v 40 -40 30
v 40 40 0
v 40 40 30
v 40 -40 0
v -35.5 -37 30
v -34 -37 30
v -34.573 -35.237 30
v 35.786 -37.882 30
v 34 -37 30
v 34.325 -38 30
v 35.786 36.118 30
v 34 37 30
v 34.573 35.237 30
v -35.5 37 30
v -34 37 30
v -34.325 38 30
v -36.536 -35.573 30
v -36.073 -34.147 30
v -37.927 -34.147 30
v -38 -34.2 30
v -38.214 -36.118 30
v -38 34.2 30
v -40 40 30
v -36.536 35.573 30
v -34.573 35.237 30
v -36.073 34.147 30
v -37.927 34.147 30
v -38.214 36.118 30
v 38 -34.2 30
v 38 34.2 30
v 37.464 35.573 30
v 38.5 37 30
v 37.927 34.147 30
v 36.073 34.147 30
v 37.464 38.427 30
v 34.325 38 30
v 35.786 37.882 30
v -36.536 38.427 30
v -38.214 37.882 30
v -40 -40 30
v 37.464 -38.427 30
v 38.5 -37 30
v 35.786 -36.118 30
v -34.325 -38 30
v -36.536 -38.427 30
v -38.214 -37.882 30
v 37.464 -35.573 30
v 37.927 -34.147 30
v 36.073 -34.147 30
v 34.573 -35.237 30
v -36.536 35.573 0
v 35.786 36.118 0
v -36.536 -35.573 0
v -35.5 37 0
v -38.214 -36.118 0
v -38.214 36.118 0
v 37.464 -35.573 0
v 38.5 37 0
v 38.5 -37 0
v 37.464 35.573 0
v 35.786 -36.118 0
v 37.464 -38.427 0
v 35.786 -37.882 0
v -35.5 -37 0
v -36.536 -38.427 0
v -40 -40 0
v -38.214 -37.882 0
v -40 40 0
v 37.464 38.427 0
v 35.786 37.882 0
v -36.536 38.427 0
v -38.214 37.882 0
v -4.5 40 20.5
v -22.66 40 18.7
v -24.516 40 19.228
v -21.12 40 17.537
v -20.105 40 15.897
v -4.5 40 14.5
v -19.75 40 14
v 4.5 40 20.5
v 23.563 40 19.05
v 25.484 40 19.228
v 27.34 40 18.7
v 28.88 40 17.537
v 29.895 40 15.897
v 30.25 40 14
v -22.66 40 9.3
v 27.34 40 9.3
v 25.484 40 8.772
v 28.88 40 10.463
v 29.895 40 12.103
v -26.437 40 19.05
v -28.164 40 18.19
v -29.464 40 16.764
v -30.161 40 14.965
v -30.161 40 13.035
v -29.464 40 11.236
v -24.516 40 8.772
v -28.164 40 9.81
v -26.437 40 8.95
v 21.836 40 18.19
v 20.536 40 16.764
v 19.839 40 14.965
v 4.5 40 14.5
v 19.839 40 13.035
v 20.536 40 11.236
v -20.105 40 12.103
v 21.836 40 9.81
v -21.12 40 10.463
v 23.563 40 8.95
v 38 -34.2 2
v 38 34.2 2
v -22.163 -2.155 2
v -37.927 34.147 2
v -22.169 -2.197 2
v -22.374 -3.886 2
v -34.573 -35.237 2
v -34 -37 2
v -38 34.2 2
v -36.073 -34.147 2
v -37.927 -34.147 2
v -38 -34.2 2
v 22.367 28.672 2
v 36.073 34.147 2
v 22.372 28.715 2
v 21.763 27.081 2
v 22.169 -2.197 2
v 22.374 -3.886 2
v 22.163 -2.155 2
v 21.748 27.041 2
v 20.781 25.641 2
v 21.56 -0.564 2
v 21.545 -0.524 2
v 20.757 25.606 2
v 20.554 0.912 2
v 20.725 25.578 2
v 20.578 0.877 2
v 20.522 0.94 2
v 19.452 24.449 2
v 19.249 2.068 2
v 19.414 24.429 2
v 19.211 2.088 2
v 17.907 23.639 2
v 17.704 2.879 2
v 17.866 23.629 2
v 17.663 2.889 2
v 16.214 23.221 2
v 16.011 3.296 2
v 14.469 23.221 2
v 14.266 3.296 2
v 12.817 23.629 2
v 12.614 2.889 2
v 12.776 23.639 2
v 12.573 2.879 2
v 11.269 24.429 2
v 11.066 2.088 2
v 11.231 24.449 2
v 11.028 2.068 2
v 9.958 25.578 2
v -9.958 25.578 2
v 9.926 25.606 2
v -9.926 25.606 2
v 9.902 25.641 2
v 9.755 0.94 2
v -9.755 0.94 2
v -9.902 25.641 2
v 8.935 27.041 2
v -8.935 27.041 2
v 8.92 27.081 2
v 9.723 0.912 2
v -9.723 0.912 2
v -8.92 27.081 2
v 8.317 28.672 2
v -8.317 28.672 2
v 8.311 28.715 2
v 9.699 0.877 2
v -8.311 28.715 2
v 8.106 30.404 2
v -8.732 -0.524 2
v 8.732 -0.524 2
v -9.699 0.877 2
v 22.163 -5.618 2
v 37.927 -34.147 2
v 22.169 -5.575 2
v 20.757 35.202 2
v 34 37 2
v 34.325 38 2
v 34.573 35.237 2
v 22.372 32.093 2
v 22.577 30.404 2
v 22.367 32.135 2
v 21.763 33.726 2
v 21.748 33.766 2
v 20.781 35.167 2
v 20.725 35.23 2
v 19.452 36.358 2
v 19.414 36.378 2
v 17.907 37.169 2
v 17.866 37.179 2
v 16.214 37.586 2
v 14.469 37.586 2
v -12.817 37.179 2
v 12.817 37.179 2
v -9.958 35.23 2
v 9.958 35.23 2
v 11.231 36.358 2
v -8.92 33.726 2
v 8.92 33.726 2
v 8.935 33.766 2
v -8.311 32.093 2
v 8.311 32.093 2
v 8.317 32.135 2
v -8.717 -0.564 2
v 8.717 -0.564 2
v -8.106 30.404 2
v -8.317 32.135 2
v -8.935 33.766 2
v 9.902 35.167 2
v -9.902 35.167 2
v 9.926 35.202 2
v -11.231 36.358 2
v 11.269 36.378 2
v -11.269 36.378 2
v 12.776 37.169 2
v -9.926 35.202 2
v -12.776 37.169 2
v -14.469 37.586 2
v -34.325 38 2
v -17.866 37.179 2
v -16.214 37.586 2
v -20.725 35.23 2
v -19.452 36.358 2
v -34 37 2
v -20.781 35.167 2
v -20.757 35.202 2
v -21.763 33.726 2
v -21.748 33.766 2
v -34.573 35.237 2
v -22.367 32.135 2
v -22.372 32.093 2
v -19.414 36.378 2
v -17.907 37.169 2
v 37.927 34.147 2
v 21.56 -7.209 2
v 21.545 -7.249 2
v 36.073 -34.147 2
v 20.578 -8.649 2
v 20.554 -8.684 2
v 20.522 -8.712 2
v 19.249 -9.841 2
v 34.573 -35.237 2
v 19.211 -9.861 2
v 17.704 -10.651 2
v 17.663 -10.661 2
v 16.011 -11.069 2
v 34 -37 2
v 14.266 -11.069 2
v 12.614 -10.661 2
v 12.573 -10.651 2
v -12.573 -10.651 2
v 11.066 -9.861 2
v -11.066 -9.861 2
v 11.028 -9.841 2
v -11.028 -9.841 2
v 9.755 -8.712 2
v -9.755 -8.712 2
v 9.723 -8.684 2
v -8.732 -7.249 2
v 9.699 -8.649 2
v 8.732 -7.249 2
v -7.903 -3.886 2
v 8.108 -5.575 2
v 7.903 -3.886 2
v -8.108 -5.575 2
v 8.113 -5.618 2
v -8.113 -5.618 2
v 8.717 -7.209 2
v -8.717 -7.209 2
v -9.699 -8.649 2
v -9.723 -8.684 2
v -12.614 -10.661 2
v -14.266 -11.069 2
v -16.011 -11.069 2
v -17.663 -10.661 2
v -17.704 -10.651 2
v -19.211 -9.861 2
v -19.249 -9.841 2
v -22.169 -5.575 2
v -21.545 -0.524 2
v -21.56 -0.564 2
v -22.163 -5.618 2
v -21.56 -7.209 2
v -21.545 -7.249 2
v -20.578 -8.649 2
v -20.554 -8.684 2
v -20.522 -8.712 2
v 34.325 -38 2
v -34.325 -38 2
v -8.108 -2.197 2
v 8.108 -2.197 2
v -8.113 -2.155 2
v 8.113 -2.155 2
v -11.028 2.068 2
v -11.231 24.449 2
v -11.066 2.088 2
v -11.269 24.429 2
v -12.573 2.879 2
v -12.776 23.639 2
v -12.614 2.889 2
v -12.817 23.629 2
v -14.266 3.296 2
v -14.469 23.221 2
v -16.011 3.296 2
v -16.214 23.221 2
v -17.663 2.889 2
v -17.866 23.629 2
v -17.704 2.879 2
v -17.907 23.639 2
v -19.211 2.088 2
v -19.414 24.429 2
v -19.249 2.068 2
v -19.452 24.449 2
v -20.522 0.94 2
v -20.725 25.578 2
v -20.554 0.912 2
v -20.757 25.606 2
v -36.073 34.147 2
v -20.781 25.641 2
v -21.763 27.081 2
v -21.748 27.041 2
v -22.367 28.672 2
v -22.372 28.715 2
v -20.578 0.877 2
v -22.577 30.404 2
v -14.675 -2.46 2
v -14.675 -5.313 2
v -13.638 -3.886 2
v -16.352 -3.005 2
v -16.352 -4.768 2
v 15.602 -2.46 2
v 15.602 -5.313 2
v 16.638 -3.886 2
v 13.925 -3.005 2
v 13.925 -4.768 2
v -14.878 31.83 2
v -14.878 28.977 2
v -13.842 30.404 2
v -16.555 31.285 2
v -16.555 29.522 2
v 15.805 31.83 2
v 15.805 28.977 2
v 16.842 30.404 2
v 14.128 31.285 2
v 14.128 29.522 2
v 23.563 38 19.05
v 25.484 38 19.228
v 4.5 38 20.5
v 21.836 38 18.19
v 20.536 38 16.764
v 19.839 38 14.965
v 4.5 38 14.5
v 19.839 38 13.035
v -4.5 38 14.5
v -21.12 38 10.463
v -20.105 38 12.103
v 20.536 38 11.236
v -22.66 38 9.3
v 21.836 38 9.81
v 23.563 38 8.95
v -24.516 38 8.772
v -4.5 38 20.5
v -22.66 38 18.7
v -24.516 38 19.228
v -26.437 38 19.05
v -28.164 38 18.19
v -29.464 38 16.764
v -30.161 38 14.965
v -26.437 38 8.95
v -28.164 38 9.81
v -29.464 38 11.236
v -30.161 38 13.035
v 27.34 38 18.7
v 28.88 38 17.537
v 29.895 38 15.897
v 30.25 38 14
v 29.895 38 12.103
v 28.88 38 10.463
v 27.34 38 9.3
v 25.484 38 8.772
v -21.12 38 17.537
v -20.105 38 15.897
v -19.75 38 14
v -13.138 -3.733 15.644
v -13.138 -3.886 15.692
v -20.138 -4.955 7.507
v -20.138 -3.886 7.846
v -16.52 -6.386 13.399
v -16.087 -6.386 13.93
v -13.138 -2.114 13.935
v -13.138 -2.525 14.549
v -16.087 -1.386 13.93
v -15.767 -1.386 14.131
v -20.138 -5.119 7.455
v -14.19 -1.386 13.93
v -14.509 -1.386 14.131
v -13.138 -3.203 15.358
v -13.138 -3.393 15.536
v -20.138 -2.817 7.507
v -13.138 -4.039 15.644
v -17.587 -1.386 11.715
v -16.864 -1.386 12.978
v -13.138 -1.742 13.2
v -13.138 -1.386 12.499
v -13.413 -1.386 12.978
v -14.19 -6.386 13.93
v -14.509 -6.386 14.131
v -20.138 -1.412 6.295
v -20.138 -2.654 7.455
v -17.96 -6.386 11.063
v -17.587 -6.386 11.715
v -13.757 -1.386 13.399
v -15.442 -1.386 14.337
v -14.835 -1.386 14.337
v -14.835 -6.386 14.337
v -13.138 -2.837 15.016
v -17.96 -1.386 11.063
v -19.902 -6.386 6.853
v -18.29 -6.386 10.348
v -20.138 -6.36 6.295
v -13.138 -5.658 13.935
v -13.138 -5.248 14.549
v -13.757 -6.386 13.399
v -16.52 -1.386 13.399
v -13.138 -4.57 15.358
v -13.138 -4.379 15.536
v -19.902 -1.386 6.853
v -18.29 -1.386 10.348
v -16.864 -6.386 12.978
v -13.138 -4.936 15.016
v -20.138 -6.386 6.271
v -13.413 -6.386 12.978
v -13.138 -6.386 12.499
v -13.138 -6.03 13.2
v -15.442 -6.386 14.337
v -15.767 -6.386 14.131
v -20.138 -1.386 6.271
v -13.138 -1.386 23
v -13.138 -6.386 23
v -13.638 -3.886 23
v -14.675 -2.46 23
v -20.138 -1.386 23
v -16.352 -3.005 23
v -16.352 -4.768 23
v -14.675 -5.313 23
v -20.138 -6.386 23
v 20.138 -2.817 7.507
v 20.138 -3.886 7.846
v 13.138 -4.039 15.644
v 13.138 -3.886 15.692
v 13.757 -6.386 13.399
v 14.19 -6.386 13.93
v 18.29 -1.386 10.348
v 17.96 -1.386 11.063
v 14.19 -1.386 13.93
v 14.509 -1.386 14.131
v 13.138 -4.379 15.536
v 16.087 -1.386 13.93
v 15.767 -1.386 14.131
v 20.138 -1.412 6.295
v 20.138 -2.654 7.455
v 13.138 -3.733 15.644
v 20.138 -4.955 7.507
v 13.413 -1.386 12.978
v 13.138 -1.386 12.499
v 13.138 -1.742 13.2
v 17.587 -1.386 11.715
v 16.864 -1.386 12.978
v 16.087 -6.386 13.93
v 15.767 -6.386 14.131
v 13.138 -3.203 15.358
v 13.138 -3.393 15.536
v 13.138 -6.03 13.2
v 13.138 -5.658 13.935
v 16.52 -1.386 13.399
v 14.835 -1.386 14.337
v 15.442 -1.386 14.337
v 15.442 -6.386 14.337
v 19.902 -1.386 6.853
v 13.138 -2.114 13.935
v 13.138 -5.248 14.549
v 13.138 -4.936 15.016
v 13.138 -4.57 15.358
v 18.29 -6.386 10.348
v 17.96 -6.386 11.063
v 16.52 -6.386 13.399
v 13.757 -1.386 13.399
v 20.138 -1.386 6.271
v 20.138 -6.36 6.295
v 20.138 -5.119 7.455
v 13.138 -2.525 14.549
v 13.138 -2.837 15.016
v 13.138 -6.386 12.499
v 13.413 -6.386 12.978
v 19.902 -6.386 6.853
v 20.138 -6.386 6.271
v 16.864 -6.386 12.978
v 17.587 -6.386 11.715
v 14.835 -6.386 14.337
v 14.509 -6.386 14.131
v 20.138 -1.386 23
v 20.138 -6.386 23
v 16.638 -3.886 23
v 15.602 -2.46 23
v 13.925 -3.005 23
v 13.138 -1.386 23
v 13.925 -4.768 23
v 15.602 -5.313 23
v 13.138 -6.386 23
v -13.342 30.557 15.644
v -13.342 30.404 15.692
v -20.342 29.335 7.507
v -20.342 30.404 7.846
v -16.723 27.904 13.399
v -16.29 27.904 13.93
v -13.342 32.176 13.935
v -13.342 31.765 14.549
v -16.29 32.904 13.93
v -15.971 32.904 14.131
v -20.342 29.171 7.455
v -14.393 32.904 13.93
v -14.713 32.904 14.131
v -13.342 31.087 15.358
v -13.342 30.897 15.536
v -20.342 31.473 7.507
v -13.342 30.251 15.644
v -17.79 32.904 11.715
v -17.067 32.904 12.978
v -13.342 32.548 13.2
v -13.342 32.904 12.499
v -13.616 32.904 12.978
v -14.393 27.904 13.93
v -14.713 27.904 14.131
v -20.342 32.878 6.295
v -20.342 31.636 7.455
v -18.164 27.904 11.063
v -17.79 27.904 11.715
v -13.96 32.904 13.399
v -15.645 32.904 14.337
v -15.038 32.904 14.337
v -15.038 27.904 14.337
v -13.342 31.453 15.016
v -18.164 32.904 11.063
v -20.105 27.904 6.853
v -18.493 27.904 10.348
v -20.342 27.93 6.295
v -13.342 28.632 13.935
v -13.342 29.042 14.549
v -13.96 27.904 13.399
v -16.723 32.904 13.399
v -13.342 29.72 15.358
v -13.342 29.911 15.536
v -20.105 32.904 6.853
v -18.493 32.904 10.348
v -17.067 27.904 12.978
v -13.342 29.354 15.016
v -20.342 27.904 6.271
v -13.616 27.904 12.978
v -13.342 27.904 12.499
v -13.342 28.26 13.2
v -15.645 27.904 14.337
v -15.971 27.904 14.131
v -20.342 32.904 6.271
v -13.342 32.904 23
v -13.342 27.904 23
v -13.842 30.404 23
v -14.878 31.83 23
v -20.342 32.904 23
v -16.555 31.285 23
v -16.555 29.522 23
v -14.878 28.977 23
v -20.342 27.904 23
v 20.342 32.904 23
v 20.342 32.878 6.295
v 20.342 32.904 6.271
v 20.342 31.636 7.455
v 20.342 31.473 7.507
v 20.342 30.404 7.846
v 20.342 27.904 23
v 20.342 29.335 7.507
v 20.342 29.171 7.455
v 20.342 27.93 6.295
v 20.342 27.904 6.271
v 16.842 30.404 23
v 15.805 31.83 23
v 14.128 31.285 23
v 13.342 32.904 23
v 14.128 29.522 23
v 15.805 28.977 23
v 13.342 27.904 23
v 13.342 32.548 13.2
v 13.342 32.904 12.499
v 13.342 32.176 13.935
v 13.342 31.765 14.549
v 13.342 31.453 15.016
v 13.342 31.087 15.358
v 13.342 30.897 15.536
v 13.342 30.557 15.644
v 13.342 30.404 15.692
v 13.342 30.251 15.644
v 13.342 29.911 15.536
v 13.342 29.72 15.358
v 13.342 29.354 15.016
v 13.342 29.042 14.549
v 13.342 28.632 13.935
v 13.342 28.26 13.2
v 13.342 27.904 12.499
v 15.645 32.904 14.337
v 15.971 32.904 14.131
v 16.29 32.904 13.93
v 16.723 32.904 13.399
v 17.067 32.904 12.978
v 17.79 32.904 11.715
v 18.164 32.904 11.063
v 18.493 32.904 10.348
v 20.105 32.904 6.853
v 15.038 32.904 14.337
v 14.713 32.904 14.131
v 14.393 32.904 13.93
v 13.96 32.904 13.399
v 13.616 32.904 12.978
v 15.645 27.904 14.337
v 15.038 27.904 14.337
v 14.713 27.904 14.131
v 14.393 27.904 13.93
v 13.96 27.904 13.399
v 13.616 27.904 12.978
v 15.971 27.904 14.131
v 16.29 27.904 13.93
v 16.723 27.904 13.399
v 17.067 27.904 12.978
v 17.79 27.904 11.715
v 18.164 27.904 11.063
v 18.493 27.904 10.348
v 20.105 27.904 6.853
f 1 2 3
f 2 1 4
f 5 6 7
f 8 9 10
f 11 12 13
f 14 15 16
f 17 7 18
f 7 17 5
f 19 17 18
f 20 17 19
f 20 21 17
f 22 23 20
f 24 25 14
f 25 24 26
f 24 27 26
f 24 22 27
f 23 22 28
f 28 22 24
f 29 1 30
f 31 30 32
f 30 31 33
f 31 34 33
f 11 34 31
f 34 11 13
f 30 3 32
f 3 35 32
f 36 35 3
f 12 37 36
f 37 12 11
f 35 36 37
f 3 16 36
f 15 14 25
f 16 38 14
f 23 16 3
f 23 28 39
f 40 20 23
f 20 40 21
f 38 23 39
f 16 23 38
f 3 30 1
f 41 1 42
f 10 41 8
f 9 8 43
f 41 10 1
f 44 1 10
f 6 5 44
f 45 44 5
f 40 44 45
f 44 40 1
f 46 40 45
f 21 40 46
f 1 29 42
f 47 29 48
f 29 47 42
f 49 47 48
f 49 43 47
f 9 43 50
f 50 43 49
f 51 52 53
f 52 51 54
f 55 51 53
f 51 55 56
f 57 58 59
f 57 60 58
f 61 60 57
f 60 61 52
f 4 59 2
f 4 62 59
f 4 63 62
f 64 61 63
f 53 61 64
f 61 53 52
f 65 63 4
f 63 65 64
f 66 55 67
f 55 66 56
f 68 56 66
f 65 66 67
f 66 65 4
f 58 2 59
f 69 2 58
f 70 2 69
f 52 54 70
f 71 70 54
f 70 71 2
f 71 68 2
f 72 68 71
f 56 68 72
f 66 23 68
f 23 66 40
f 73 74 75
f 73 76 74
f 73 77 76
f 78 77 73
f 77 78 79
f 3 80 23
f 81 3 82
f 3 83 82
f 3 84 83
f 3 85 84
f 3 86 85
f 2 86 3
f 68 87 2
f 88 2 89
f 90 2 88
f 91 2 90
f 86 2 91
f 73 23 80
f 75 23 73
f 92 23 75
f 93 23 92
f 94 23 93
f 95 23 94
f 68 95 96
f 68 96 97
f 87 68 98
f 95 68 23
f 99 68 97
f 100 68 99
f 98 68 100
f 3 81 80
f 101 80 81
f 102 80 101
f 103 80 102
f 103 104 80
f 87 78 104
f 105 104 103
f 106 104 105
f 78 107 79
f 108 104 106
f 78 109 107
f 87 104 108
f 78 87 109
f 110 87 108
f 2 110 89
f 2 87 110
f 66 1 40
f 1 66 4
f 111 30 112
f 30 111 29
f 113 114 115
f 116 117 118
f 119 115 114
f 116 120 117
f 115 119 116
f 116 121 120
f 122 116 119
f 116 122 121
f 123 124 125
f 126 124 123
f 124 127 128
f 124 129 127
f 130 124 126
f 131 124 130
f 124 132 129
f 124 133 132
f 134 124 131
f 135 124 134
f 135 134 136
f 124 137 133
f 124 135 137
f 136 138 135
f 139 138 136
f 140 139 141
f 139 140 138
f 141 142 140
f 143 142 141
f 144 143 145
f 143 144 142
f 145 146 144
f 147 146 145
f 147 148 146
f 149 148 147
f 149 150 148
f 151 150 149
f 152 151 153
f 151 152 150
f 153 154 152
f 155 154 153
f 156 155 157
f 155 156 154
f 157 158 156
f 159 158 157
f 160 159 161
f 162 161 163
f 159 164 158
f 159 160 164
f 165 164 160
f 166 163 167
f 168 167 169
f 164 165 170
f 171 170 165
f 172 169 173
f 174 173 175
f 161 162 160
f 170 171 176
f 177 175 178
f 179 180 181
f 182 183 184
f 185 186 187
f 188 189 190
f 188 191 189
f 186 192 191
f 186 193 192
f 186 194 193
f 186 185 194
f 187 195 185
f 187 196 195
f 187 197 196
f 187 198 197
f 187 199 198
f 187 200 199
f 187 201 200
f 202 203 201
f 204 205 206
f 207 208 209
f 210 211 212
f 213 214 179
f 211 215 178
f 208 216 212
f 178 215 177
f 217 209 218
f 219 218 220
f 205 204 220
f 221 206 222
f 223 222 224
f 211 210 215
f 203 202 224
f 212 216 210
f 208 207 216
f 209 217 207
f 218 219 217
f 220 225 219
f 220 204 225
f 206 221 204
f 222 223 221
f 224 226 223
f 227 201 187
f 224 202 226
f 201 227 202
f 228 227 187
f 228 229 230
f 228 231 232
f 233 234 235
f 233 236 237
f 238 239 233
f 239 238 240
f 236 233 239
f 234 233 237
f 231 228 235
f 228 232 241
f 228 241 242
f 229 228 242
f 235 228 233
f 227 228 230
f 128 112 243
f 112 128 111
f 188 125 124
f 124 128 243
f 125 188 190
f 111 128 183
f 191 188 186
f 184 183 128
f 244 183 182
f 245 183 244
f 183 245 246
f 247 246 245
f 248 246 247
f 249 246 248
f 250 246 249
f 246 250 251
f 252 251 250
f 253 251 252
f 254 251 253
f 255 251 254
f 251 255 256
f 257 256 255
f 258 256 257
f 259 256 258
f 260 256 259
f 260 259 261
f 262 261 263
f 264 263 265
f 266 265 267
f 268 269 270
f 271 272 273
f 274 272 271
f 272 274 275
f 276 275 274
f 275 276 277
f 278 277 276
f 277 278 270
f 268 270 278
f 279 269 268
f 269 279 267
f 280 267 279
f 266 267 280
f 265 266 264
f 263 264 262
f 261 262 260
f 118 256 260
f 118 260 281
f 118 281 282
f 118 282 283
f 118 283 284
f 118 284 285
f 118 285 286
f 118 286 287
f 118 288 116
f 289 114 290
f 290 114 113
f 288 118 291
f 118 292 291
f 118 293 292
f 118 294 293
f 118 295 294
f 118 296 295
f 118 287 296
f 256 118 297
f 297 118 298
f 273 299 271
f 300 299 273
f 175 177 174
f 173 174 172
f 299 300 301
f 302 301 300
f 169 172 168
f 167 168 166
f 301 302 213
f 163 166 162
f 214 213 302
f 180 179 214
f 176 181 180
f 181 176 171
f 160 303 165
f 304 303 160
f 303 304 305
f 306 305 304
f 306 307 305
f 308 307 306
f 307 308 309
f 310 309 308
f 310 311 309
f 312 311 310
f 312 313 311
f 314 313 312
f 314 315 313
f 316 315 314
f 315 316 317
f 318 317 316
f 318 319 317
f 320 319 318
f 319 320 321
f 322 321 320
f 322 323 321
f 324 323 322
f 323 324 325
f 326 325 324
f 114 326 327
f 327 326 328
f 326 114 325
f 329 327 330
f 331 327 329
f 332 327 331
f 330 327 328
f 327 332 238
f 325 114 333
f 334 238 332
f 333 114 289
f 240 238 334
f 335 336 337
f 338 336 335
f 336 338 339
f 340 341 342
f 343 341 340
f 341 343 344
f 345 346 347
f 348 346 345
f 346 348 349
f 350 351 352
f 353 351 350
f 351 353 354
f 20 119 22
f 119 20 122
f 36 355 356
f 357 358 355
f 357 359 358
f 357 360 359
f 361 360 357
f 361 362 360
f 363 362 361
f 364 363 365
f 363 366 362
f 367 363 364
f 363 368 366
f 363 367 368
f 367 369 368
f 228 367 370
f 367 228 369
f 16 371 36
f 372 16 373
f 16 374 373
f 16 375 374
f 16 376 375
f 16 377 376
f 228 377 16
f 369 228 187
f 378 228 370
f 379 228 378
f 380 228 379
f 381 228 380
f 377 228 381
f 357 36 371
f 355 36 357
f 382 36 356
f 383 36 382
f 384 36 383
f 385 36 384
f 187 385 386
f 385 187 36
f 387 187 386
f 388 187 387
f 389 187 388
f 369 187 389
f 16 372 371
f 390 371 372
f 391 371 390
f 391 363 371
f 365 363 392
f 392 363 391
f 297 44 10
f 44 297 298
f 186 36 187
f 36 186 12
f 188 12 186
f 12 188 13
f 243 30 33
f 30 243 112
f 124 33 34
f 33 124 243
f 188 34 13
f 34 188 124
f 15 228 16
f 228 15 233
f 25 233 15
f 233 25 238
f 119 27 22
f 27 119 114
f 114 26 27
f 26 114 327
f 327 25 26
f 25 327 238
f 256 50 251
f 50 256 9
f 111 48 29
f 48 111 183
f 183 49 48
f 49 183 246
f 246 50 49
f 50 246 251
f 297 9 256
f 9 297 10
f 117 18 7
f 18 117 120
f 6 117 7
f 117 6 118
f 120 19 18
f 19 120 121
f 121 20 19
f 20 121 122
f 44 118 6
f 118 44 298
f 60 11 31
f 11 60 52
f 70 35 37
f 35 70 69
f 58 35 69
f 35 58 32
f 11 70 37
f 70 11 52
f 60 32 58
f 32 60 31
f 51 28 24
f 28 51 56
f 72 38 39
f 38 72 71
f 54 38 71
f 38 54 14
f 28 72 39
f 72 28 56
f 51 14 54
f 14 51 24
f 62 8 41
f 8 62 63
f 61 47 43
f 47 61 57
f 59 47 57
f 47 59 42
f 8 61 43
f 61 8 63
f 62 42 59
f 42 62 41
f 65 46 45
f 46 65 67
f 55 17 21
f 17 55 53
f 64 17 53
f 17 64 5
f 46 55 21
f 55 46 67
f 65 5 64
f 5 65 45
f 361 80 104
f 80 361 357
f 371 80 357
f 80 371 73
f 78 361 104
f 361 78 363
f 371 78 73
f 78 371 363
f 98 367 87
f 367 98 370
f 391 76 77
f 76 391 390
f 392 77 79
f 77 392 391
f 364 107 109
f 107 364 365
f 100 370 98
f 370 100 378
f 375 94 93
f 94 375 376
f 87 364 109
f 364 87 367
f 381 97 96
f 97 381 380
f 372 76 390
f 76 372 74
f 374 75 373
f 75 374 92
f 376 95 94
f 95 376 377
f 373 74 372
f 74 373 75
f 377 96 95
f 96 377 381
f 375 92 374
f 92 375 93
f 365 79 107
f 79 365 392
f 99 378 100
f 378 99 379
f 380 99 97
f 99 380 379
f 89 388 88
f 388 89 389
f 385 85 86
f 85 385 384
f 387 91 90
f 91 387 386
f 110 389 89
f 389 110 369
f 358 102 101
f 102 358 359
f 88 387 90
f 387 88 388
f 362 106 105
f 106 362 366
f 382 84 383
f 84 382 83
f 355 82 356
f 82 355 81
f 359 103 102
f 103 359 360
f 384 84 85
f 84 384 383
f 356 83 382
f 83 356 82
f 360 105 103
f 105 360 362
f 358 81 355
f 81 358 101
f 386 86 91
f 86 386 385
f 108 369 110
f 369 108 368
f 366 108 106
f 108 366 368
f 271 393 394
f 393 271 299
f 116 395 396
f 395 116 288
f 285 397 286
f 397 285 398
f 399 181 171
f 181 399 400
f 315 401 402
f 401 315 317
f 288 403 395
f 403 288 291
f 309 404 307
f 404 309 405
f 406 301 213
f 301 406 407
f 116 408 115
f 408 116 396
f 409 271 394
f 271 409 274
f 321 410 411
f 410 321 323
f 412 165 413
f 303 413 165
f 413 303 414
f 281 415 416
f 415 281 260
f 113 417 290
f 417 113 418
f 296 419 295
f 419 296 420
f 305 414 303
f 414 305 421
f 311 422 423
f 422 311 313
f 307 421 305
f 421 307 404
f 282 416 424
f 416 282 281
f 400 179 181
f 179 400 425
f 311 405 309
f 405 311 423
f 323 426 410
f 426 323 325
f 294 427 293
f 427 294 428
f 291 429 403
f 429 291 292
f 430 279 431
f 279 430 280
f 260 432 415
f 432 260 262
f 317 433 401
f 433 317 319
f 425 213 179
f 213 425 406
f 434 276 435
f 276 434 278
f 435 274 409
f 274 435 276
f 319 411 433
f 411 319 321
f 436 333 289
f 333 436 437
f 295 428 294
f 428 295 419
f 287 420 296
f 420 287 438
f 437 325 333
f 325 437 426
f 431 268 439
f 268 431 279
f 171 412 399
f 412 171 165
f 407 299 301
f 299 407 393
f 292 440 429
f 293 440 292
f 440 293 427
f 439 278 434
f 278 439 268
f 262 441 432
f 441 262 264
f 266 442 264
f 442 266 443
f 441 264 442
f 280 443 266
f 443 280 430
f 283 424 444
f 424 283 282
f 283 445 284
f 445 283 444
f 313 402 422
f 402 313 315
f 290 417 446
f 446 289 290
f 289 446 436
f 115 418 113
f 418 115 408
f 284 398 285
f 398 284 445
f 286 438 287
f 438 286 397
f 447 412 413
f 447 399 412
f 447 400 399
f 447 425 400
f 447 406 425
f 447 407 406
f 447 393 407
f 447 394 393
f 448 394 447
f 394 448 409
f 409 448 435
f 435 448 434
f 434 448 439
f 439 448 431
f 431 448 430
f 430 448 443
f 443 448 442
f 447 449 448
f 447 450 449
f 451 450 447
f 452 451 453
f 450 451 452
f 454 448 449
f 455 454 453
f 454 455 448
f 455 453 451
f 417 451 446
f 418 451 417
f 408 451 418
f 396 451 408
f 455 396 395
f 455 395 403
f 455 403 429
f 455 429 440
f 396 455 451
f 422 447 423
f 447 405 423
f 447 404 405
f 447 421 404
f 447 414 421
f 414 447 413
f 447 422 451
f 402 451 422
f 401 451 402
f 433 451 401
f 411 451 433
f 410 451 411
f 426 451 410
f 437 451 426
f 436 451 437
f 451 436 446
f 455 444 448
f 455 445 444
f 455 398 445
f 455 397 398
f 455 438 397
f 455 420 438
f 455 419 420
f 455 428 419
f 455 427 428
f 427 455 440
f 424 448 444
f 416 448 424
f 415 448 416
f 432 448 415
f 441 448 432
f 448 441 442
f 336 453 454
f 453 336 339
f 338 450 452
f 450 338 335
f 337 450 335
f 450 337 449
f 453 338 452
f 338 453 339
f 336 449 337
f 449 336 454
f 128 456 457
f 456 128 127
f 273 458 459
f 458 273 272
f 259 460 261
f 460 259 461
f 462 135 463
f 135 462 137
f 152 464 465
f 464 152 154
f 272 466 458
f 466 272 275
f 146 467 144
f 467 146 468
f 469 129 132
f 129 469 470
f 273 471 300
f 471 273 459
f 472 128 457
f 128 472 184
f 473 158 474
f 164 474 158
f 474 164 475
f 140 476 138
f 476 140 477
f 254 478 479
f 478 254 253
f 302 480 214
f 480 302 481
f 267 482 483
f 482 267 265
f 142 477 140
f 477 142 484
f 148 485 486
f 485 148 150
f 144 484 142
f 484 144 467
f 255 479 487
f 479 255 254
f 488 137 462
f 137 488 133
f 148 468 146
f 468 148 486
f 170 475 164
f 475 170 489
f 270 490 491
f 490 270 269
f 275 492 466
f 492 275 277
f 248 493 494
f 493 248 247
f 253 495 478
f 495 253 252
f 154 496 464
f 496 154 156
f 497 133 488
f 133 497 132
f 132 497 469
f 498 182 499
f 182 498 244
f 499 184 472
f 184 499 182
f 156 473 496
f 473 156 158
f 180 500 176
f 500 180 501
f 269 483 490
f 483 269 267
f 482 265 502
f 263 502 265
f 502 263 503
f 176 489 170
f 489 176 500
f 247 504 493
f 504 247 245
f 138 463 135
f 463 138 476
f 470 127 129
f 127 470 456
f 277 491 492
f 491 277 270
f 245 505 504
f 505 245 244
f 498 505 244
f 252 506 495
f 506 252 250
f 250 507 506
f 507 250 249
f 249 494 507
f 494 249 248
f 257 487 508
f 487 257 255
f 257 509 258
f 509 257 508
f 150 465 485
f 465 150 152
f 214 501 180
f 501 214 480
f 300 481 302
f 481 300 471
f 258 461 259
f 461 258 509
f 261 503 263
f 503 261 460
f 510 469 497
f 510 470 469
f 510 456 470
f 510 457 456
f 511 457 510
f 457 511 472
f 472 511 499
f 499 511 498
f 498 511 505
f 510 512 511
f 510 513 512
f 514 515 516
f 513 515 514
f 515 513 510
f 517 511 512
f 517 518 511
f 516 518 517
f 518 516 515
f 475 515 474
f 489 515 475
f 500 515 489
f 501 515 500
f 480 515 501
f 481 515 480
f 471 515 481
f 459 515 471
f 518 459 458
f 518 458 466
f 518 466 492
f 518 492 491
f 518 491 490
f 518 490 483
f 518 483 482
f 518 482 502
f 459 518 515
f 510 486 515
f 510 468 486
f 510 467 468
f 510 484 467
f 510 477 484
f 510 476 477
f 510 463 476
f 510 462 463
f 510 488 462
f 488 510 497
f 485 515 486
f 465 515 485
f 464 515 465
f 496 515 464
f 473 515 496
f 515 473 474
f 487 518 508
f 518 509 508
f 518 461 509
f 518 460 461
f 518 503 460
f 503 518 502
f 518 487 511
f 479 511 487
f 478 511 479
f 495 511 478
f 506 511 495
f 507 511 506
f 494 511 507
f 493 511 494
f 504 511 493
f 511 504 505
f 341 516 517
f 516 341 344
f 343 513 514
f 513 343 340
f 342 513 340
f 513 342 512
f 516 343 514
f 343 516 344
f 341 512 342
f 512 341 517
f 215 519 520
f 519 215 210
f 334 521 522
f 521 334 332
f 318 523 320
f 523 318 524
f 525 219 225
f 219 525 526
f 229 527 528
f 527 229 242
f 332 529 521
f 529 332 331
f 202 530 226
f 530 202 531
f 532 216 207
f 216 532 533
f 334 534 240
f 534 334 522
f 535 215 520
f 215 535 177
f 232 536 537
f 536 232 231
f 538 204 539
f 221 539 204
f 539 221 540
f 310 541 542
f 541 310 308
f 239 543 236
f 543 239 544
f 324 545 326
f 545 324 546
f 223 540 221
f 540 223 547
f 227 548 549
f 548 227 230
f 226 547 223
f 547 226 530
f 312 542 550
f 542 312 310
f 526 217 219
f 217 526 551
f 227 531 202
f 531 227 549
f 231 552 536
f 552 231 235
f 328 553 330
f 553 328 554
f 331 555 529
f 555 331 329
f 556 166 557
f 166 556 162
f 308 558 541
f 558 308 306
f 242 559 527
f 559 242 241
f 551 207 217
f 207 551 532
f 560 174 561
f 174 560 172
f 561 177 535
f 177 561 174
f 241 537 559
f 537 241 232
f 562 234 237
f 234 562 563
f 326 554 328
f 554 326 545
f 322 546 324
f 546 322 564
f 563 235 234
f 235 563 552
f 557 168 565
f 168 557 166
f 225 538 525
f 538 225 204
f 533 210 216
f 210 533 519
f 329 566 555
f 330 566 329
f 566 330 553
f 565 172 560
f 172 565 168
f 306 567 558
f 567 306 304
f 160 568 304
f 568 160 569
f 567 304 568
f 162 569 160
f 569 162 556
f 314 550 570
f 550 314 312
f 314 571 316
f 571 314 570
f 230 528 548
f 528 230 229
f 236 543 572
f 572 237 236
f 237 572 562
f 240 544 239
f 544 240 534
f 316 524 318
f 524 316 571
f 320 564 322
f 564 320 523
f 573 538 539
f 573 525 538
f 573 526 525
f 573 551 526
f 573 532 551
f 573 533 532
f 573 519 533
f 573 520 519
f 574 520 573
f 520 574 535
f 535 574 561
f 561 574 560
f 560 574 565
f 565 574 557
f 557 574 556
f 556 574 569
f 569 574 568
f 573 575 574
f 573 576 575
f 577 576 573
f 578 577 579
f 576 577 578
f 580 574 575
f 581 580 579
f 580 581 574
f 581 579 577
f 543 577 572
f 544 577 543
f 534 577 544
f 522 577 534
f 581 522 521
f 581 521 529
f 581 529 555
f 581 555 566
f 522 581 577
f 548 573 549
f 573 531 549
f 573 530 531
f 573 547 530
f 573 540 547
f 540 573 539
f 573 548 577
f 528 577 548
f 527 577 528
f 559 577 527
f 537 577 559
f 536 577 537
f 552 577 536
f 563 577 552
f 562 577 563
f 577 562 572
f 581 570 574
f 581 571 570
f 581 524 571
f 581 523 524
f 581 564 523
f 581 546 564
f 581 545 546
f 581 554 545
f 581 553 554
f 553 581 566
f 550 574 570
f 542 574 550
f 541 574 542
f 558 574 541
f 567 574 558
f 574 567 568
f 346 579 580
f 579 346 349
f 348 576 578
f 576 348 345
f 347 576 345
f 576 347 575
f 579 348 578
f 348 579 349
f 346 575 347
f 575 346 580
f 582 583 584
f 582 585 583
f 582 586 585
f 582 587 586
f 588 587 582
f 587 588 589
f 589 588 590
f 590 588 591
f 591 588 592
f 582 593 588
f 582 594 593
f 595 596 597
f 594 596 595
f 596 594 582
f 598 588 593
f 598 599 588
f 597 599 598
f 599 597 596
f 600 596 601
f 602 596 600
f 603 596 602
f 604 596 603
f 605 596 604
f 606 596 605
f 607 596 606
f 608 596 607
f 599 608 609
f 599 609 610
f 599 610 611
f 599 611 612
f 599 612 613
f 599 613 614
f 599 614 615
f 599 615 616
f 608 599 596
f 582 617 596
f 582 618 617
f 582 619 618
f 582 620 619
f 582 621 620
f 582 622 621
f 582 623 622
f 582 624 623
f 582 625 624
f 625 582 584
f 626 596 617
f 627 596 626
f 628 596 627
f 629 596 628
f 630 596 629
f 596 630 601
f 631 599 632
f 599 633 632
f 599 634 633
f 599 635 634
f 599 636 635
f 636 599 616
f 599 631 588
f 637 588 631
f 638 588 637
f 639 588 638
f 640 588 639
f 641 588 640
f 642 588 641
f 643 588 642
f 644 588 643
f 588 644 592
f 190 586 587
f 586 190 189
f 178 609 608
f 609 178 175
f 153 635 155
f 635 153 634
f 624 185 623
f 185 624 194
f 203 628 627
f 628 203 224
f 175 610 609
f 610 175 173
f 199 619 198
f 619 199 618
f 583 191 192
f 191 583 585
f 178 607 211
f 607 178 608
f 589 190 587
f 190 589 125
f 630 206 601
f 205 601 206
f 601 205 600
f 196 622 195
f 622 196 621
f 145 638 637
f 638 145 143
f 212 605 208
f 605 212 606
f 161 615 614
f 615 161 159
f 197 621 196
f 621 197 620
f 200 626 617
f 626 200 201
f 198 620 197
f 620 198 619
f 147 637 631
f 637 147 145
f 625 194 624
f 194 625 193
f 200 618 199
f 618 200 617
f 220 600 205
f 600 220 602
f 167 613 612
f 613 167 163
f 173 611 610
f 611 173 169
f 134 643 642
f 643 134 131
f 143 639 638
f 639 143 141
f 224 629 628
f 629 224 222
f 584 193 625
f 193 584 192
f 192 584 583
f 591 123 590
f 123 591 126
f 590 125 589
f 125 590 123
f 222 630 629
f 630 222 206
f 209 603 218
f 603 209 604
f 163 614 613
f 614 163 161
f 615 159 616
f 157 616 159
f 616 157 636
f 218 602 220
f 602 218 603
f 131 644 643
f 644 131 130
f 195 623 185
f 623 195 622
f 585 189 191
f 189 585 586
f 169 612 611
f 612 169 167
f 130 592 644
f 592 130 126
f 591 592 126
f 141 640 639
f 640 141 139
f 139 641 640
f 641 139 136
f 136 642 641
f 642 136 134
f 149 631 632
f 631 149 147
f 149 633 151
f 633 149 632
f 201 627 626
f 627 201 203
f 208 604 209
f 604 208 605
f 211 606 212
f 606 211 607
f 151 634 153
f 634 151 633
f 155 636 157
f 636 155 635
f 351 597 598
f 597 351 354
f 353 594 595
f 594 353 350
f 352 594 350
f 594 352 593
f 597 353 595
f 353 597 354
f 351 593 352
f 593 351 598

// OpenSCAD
 box();
module box()
{
difference()
{
union()    
{
difference()
{
translate([-40,-40,0])
cube([80,80,30]);
translate([-38,-38,2])
cube([76,76,30]);    
}

 translate([37,37,0])
 cylinder(r=6/2, h=30);
 translate([-37,37,0])
 cylinder(r=6/2, h=30);
 translate([37,-37,0])
 cylinder(r=6/2, h=30);
 translate([-37,-37,0])
 cylinder(r=6/2, h=30);
}
 translate([37,37,0])
 cylinder(r=3/2, h=30);
 translate([-37,37,0])
 cylinder(r=3/2, h=30);
 translate([37,-37,0])
 cylinder(r=3/2, h=30);
 translate([-37,-37,0])
 cylinder(r=3/2, h=30);

translate([-4.5,20,23-8.5])
cube([9,30,6]);

translate([-25,45,14])
rotate([90,0,0])
cylinder(r=10.5/2,h=30);
translate([25,45,14])
rotate([90,0,0])
cylinder(r=10.5/2,h=30);

}

nodemcumounts();

}

module nodemcumounts()
{   
    translate([-15.1384,-3.8862,0])
    {
    difference(){
    union()
    {
    cylinder(h = 17, r1=8,r2=1.5);
    translate([-5,-2.5,0])    
    cube([7,5,23]);
    }    
  cylinder(h=25, r=1.5);
        }}
    translate([15.1384,-3.8862,0])
    {
        difference(){
   union()
            {
            cylinder(h = 17, r1=8,r2=1.5);
    translate([-2,-2.5,0])    
    cube([7,5,23]);
            }
            cylinder(h=25, r=1.5); 
    }
    }
    }
    translate([-15.3416,30.4038,0])
    {
        difference()
        {
        union(){
            cylinder(h = 17, r1=8,r2=1.5);
        translate([-5,-2.5,0])    
        cube([7,5,23]); 
        }
            cylinder(h=25, r=1.5);
        
    }
    }
    translate([15.3416,30.4038,0])
    {
        difference(){
        union()
            {
         translate([-2,-2.5,0])    
        cube([7,5,23]); 
                cylinder(h = 17, r1=8,r2=1.5);
                
            }
            cylinder(h=25, r=1.5);
    }
}
